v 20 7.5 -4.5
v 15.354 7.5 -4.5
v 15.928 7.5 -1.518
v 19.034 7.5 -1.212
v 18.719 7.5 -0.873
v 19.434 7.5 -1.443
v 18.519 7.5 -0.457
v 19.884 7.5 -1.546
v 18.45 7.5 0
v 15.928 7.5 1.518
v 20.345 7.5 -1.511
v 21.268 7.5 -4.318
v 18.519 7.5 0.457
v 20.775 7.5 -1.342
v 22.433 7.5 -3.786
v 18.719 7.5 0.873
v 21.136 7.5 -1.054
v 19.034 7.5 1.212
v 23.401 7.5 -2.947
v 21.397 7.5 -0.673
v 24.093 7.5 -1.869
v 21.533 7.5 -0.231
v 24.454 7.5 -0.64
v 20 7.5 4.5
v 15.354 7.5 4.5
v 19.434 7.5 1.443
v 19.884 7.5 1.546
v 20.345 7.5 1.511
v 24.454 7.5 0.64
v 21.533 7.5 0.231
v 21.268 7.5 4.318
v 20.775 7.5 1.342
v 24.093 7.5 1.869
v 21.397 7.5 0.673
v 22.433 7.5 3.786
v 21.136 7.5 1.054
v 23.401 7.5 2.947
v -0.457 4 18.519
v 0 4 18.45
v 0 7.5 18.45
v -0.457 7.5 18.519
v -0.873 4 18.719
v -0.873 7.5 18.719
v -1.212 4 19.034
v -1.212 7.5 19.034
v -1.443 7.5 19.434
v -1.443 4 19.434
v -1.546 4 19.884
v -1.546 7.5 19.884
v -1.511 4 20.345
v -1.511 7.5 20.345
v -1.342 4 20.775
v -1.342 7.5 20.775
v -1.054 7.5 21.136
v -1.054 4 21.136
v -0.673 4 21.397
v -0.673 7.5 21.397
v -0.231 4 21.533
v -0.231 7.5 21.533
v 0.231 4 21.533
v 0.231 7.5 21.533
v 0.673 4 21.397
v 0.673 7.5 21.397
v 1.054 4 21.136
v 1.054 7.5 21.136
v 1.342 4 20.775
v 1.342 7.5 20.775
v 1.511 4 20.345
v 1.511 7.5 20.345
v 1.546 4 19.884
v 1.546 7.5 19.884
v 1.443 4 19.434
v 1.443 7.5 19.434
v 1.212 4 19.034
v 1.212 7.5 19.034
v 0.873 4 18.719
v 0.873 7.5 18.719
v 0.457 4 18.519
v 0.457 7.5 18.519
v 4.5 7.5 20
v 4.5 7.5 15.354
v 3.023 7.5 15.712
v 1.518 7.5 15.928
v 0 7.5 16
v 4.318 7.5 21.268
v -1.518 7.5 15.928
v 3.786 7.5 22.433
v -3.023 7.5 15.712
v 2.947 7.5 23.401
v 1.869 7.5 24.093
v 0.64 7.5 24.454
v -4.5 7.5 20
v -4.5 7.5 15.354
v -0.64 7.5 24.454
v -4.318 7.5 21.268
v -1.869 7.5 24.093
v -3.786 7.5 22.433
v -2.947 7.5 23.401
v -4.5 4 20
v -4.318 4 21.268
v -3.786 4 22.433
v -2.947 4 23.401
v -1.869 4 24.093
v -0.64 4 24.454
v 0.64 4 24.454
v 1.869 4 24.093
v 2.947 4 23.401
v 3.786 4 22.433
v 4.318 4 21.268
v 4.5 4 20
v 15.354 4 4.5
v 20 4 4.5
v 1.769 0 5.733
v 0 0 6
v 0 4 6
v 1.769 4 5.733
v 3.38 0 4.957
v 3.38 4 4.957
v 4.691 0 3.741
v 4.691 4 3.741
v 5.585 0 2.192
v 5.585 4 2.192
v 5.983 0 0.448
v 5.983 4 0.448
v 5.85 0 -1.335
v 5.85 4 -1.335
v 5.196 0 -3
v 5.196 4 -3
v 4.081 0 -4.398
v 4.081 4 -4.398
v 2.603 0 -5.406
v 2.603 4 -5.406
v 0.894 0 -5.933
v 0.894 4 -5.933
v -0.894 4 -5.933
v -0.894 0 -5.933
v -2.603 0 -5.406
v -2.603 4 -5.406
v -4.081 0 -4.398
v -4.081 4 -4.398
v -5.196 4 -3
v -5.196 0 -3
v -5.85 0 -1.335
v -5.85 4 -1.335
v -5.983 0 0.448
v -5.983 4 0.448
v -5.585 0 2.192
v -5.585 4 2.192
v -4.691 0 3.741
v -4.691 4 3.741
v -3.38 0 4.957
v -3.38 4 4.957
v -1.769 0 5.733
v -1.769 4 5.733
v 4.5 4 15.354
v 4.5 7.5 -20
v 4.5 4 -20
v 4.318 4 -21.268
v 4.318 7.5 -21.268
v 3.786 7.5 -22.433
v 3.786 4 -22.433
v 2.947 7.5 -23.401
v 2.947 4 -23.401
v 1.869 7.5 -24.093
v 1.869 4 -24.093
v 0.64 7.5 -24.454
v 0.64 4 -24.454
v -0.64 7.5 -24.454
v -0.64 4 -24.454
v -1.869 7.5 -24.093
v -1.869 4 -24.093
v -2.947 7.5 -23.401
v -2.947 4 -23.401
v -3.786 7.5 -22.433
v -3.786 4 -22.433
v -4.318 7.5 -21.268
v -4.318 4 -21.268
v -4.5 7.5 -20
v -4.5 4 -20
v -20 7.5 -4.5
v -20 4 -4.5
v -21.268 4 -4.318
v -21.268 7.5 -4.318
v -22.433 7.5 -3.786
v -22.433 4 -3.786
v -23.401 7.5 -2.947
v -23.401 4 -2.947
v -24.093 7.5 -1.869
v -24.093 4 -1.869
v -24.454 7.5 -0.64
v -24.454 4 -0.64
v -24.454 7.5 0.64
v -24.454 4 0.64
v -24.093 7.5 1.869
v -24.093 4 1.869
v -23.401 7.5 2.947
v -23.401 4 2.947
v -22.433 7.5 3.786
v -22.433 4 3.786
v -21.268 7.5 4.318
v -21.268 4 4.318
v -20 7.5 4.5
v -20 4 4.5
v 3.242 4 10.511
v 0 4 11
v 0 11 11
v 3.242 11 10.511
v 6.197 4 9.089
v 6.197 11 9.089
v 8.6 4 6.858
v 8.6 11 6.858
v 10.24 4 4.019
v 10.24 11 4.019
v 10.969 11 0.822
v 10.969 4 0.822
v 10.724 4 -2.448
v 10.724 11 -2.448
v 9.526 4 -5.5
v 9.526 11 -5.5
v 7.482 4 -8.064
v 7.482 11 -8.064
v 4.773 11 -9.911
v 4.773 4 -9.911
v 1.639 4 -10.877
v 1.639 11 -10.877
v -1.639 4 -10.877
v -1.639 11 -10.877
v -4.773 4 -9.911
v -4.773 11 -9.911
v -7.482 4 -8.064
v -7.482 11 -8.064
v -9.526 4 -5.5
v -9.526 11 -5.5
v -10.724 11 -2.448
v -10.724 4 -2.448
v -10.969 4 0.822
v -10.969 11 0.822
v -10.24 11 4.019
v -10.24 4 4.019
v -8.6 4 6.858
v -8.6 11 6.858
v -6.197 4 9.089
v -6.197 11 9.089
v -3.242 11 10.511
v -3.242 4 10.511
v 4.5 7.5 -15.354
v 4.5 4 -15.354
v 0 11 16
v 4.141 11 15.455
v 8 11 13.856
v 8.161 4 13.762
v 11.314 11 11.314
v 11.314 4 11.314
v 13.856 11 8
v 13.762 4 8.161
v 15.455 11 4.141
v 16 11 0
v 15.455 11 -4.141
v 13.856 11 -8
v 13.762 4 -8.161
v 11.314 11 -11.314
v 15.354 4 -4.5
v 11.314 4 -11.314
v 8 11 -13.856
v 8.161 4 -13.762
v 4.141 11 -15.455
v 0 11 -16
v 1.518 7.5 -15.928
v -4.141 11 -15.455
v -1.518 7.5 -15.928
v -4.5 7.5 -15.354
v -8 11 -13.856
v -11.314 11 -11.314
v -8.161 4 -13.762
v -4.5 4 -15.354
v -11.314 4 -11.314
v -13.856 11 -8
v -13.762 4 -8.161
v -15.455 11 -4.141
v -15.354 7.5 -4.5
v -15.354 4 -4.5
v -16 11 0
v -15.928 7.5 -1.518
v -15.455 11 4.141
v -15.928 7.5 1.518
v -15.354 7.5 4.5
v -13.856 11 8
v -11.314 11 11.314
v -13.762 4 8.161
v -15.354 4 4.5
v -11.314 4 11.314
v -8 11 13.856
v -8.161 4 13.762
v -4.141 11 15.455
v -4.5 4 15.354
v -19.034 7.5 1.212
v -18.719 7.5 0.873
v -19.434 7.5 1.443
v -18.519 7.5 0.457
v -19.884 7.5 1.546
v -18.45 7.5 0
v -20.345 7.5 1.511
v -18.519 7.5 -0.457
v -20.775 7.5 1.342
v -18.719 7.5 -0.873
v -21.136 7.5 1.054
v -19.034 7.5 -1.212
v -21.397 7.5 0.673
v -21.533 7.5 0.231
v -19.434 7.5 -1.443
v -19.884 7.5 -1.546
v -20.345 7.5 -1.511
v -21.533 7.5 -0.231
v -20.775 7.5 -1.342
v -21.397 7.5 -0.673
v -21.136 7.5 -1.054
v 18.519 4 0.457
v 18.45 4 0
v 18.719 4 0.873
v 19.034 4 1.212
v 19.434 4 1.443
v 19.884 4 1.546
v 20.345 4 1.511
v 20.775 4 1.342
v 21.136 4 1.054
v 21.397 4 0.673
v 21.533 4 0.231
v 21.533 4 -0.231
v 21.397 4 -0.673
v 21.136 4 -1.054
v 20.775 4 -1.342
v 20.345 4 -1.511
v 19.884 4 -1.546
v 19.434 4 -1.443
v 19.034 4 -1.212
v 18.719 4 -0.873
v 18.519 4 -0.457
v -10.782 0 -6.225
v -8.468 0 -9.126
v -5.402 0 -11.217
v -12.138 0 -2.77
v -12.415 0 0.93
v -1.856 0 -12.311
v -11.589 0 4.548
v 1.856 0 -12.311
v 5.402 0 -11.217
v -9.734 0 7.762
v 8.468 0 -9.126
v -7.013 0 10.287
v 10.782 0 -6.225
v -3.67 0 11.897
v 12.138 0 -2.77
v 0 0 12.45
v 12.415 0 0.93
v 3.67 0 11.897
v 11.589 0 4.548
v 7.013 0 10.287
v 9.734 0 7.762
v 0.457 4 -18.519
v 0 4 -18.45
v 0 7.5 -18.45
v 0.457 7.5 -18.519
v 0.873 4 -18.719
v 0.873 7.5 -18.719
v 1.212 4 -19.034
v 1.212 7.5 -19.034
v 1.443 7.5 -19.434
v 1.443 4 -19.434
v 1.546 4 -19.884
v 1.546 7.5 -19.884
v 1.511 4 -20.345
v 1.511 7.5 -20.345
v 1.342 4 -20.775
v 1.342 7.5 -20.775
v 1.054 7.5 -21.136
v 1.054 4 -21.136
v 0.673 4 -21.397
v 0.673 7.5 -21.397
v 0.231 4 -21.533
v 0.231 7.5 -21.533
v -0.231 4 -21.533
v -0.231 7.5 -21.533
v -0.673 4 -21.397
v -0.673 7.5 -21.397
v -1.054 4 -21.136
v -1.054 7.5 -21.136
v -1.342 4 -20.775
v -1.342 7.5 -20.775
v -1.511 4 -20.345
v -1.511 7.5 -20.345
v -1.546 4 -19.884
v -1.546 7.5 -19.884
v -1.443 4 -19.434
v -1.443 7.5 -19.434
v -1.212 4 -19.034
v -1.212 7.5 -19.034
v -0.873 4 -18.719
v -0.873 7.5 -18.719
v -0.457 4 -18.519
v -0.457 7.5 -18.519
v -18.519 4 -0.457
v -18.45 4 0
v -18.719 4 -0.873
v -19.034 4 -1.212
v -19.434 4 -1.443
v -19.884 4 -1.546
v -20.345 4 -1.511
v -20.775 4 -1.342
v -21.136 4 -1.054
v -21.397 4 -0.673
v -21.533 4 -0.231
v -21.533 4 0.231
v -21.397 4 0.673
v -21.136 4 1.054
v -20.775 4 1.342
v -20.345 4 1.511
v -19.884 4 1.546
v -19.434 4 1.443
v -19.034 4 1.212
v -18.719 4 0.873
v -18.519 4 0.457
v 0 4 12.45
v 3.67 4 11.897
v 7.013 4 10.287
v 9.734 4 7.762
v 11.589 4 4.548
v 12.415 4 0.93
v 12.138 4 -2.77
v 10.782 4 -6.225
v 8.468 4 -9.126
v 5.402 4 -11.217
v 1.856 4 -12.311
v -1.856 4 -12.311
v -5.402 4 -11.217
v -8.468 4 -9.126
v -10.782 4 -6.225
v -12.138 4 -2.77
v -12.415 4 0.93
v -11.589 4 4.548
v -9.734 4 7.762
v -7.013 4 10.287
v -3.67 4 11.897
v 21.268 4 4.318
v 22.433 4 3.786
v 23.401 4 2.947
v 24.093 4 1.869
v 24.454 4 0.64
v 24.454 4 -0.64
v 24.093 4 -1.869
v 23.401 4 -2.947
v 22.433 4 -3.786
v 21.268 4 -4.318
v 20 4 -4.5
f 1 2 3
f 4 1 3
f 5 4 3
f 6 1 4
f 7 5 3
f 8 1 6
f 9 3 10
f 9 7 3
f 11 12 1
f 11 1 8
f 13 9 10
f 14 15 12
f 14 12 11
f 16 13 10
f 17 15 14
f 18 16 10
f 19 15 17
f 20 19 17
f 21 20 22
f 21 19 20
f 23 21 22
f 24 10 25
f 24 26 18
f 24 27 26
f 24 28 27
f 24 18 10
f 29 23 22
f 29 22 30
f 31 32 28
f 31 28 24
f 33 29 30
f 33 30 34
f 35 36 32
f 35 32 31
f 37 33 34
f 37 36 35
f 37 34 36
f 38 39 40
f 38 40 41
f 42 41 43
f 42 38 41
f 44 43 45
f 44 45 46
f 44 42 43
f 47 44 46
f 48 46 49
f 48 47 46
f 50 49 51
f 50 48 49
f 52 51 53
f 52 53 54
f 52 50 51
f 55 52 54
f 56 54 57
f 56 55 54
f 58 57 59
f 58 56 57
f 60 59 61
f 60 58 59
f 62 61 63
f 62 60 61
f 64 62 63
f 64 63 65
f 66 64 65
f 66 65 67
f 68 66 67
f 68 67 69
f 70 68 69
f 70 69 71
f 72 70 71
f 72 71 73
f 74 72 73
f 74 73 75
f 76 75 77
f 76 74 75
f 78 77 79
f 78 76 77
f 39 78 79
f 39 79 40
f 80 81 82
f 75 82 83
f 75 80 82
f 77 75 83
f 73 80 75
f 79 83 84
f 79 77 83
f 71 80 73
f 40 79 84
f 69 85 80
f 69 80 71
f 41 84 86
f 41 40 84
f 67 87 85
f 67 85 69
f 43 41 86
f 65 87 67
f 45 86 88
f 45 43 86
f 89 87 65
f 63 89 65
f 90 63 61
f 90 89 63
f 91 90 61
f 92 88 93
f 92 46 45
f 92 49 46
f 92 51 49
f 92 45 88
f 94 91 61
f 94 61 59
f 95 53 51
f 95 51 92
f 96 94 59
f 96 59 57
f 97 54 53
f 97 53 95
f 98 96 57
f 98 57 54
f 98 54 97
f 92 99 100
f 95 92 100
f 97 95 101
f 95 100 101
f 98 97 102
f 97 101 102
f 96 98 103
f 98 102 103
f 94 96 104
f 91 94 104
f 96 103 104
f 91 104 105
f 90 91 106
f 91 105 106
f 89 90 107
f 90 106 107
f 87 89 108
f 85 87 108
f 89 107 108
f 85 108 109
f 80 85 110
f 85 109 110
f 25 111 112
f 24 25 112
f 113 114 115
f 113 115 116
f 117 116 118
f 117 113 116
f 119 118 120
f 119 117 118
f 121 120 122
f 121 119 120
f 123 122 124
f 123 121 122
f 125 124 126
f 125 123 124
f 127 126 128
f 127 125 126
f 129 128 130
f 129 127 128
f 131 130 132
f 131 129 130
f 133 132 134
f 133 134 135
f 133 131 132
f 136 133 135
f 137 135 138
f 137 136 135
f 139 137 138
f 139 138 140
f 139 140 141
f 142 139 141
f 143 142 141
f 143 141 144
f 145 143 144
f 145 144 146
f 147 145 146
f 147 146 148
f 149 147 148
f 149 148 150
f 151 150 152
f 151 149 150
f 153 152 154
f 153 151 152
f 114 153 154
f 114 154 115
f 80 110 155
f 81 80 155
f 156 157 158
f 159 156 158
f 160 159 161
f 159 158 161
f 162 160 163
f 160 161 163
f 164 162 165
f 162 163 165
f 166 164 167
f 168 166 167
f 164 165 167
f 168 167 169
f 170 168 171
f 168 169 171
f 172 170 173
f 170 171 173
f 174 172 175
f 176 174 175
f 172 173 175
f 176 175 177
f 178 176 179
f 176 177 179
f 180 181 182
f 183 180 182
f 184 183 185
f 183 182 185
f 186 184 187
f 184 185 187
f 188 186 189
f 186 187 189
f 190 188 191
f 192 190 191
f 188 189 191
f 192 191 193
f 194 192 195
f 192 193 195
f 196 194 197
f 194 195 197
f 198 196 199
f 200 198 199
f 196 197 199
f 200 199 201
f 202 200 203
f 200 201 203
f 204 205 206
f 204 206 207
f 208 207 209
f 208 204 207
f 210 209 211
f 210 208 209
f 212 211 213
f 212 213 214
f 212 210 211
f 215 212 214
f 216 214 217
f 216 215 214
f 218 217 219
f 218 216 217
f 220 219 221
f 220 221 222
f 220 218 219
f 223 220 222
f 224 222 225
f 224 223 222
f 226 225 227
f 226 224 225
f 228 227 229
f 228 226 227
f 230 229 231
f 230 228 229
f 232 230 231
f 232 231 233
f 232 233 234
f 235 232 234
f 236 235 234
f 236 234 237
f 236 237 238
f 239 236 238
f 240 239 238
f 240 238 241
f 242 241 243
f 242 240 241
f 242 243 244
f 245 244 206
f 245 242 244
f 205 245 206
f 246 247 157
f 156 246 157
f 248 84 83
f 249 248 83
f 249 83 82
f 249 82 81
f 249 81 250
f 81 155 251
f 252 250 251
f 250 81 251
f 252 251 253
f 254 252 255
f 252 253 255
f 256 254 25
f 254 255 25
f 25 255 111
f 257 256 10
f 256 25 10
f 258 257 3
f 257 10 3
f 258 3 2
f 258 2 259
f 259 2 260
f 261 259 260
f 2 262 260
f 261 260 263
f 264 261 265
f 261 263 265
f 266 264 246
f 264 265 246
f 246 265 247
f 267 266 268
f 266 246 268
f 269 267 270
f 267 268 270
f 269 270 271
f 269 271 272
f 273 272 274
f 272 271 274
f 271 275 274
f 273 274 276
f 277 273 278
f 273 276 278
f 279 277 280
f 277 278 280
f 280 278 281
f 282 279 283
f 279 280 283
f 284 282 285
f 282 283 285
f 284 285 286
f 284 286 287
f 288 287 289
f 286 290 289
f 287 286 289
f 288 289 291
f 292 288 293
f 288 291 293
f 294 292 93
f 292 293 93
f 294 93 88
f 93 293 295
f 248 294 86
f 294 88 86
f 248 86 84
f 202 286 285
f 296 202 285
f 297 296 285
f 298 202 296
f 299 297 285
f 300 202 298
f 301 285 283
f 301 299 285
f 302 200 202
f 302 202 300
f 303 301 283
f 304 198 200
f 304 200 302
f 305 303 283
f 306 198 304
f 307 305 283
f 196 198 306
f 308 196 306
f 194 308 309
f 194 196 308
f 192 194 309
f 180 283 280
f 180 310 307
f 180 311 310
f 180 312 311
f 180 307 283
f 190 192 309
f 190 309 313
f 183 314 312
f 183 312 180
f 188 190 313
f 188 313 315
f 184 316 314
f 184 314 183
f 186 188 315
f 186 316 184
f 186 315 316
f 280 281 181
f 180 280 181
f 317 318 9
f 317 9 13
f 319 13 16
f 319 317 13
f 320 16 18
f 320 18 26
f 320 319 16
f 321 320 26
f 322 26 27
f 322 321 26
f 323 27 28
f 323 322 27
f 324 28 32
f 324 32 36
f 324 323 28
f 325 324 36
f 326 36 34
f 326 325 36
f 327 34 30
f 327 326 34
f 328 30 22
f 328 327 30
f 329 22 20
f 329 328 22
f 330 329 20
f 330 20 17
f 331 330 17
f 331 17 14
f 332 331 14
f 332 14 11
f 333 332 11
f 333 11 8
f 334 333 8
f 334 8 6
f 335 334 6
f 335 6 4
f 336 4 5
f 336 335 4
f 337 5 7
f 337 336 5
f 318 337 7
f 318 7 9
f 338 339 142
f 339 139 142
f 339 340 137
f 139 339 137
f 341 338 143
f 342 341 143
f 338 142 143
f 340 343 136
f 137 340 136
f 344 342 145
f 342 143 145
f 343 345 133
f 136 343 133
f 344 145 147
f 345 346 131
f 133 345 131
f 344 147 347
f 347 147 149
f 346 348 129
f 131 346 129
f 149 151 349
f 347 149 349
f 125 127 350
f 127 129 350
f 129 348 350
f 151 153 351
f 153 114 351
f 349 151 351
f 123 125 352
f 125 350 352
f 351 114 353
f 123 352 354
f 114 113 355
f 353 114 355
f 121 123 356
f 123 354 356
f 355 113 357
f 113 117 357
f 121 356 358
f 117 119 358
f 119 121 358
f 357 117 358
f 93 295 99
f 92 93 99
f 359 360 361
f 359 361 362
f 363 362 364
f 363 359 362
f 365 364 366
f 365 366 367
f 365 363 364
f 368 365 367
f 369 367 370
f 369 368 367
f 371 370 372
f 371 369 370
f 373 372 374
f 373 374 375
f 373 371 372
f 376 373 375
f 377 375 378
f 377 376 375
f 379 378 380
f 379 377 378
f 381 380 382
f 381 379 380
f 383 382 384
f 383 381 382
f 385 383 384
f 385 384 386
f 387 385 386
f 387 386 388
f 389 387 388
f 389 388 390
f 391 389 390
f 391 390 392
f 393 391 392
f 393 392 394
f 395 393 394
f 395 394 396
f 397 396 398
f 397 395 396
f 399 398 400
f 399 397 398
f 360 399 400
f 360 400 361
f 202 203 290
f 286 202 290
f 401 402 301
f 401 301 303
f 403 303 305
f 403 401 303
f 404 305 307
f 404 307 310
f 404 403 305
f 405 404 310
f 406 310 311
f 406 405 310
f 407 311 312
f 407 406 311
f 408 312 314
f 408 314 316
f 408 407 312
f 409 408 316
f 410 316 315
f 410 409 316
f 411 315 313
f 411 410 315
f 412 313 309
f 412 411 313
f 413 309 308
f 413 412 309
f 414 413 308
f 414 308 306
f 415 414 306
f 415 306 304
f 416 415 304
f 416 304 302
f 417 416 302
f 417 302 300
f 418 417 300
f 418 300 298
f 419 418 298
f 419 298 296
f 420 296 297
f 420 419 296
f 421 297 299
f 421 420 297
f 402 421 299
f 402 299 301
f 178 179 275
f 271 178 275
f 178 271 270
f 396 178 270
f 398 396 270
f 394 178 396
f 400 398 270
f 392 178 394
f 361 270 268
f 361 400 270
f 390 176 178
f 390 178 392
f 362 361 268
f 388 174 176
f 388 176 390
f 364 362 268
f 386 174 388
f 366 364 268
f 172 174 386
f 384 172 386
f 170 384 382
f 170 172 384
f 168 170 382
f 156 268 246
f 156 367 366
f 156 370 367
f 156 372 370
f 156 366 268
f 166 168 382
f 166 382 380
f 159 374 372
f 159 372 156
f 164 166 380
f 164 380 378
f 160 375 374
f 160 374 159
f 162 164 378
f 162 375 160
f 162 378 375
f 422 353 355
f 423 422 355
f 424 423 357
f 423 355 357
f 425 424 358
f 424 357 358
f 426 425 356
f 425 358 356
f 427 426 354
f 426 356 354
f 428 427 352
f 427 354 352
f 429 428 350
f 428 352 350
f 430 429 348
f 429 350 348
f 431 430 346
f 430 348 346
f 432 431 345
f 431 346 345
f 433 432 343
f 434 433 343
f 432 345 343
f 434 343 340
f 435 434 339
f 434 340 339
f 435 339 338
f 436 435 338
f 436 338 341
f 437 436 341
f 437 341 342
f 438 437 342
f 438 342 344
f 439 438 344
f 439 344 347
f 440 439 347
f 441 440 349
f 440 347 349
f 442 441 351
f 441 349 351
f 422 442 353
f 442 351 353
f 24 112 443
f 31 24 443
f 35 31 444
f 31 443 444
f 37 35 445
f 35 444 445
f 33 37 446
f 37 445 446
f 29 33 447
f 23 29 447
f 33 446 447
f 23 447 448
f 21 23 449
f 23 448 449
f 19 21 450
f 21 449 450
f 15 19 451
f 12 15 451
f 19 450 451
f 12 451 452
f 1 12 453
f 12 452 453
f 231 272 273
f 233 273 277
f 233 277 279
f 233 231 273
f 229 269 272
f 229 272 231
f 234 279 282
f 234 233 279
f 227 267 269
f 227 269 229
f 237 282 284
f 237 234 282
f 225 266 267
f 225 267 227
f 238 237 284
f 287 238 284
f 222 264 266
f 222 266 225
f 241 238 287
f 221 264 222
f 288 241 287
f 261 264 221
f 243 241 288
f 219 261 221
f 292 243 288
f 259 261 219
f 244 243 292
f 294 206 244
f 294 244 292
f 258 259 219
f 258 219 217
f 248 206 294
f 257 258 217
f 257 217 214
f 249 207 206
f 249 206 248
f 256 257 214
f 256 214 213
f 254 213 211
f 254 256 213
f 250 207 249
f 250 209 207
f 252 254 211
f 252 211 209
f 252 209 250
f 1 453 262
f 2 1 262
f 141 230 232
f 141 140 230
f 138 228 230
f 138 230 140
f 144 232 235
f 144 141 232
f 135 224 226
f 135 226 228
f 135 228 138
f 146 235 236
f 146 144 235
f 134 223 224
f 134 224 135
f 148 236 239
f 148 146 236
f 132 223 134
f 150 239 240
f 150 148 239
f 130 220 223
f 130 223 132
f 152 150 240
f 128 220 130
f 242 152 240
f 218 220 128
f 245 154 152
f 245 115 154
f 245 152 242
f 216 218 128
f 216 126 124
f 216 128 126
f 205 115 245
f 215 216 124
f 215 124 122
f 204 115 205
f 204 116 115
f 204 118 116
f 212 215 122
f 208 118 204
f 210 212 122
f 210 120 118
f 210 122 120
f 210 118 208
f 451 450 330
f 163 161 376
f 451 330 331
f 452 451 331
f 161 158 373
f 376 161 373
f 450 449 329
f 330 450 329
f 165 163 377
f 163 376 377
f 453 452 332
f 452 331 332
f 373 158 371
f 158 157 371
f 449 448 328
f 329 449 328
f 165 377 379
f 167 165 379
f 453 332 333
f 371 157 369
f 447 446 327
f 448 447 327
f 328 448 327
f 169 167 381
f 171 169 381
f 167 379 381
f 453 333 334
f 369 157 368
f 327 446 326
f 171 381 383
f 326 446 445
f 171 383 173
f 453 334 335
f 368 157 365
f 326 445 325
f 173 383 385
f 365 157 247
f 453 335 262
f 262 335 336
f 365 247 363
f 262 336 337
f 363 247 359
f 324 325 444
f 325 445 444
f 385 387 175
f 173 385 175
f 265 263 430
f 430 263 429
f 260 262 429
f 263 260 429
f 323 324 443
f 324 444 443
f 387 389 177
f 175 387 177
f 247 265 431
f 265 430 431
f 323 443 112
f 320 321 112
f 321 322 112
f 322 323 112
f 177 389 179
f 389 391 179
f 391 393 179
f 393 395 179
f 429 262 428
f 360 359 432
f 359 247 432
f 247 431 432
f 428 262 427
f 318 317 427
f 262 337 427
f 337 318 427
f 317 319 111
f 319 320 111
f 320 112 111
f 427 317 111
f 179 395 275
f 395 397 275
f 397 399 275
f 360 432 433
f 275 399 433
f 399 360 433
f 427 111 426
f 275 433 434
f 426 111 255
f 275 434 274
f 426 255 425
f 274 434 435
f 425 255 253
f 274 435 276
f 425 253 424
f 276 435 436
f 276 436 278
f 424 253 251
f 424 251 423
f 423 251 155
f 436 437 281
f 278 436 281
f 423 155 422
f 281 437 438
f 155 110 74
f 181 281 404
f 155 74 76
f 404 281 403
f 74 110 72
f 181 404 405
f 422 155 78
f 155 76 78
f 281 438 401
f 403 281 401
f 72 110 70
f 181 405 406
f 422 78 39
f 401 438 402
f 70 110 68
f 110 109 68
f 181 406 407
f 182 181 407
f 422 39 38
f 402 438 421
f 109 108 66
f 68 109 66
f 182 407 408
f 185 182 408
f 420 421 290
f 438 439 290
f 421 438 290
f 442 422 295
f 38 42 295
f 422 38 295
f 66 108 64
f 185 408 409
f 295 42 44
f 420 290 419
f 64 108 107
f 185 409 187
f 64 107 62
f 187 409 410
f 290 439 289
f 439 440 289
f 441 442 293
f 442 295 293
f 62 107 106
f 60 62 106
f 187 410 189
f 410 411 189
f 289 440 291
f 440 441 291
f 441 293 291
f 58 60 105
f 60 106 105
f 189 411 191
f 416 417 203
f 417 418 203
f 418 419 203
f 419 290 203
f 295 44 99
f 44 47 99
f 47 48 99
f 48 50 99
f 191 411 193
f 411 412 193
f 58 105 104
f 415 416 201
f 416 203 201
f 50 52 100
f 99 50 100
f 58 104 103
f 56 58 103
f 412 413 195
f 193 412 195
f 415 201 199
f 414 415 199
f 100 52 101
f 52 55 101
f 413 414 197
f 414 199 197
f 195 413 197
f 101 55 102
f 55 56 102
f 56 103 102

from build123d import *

# Parameters (mm, degrees)
SKETCH1_R           = 12.45
SKETCH1_R_2         = 6
BOSS_EXTRUDE1_DEPTH = 4
SKETCH2_R           = 16
SKETCH2_R_2         = 11
BOSS_EXTRUDE2_DEPTH = 7
BOSS_EXTRUDE3_START = -7
SKETCH3_R           = 1.55
BOSS_EXTRUDE3_DEPTH = 3.5
CIRPATTERN1_COUNT   = 4


with BuildPart() as part:
    # Sketch1 → Boss-Extrude1 (new body)
    with BuildSketch(Plane(origin=(0, 0, 0), x_dir=(1, 0, 0), z_dir=(0, 1, 0))):
        with Locations(Location((0, 0, 0), (0, 0, 270))):
            Circle(SKETCH1_R)
        with Locations(Location((0, 0, 0), (0, 0, 270))):
            Circle(SKETCH1_R_2, mode=Mode.SUBTRACT)
    extrude(amount=BOSS_EXTRUDE1_DEPTH)

    # Sketch2 → Boss-Extrude2 (add)
    with BuildSketch(Plane(origin=(0, 4, 0), x_dir=(1, 0, 0), z_dir=(0, 1, 0))):
        with Locations(Location((0, 0, 0), (0, 0, 270))):
            Circle(SKETCH2_R)
        with Locations(Location((0, 0, 0), (0, 0, 270))):
            Circle(SKETCH2_R_2, mode=Mode.SUBTRACT)
    extrude(amount=BOSS_EXTRUDE2_DEPTH)

    # Sketch3 → Boss-Extrude3 (add)
    with BuildSketch(Plane(origin=(0, 11, 0), x_dir=(1, 0, 0), z_dir=(0, 1, 0)).offset(BOSS_EXTRUDE3_START)):
        with BuildLine():
            Line((-4.5, 20), (-4.5, 15.354152533))
            ThreePointArc((-4.5, 15.354152533), (0, 16), (4.5, 15.354152533))
            Line((4.5, 15.354152533), (4.5, 20))
            ThreePointArc((4.5, 20), (0, 24.5), (-4.5, 20))
        make_face()
        with Locations(Location((0, 20, 0), (0, 0, 270))):
            Circle(SKETCH3_R, mode=Mode.SUBTRACT)
    boss_extrude3 = extrude(amount=BOSS_EXTRUDE3_DEPTH)

    # CirPattern1: Boss-Extrude3 ×4 about axis
    cirpattern1_axis = Axis((0, 0, 0), (0, 1, 0))
    for i in range(1, CIRPATTERN1_COUNT):
        add(boss_extrude3.rotate(cirpattern1_axis, i * 360 / CIRPATTERN1_COUNT))


solid = part.part
